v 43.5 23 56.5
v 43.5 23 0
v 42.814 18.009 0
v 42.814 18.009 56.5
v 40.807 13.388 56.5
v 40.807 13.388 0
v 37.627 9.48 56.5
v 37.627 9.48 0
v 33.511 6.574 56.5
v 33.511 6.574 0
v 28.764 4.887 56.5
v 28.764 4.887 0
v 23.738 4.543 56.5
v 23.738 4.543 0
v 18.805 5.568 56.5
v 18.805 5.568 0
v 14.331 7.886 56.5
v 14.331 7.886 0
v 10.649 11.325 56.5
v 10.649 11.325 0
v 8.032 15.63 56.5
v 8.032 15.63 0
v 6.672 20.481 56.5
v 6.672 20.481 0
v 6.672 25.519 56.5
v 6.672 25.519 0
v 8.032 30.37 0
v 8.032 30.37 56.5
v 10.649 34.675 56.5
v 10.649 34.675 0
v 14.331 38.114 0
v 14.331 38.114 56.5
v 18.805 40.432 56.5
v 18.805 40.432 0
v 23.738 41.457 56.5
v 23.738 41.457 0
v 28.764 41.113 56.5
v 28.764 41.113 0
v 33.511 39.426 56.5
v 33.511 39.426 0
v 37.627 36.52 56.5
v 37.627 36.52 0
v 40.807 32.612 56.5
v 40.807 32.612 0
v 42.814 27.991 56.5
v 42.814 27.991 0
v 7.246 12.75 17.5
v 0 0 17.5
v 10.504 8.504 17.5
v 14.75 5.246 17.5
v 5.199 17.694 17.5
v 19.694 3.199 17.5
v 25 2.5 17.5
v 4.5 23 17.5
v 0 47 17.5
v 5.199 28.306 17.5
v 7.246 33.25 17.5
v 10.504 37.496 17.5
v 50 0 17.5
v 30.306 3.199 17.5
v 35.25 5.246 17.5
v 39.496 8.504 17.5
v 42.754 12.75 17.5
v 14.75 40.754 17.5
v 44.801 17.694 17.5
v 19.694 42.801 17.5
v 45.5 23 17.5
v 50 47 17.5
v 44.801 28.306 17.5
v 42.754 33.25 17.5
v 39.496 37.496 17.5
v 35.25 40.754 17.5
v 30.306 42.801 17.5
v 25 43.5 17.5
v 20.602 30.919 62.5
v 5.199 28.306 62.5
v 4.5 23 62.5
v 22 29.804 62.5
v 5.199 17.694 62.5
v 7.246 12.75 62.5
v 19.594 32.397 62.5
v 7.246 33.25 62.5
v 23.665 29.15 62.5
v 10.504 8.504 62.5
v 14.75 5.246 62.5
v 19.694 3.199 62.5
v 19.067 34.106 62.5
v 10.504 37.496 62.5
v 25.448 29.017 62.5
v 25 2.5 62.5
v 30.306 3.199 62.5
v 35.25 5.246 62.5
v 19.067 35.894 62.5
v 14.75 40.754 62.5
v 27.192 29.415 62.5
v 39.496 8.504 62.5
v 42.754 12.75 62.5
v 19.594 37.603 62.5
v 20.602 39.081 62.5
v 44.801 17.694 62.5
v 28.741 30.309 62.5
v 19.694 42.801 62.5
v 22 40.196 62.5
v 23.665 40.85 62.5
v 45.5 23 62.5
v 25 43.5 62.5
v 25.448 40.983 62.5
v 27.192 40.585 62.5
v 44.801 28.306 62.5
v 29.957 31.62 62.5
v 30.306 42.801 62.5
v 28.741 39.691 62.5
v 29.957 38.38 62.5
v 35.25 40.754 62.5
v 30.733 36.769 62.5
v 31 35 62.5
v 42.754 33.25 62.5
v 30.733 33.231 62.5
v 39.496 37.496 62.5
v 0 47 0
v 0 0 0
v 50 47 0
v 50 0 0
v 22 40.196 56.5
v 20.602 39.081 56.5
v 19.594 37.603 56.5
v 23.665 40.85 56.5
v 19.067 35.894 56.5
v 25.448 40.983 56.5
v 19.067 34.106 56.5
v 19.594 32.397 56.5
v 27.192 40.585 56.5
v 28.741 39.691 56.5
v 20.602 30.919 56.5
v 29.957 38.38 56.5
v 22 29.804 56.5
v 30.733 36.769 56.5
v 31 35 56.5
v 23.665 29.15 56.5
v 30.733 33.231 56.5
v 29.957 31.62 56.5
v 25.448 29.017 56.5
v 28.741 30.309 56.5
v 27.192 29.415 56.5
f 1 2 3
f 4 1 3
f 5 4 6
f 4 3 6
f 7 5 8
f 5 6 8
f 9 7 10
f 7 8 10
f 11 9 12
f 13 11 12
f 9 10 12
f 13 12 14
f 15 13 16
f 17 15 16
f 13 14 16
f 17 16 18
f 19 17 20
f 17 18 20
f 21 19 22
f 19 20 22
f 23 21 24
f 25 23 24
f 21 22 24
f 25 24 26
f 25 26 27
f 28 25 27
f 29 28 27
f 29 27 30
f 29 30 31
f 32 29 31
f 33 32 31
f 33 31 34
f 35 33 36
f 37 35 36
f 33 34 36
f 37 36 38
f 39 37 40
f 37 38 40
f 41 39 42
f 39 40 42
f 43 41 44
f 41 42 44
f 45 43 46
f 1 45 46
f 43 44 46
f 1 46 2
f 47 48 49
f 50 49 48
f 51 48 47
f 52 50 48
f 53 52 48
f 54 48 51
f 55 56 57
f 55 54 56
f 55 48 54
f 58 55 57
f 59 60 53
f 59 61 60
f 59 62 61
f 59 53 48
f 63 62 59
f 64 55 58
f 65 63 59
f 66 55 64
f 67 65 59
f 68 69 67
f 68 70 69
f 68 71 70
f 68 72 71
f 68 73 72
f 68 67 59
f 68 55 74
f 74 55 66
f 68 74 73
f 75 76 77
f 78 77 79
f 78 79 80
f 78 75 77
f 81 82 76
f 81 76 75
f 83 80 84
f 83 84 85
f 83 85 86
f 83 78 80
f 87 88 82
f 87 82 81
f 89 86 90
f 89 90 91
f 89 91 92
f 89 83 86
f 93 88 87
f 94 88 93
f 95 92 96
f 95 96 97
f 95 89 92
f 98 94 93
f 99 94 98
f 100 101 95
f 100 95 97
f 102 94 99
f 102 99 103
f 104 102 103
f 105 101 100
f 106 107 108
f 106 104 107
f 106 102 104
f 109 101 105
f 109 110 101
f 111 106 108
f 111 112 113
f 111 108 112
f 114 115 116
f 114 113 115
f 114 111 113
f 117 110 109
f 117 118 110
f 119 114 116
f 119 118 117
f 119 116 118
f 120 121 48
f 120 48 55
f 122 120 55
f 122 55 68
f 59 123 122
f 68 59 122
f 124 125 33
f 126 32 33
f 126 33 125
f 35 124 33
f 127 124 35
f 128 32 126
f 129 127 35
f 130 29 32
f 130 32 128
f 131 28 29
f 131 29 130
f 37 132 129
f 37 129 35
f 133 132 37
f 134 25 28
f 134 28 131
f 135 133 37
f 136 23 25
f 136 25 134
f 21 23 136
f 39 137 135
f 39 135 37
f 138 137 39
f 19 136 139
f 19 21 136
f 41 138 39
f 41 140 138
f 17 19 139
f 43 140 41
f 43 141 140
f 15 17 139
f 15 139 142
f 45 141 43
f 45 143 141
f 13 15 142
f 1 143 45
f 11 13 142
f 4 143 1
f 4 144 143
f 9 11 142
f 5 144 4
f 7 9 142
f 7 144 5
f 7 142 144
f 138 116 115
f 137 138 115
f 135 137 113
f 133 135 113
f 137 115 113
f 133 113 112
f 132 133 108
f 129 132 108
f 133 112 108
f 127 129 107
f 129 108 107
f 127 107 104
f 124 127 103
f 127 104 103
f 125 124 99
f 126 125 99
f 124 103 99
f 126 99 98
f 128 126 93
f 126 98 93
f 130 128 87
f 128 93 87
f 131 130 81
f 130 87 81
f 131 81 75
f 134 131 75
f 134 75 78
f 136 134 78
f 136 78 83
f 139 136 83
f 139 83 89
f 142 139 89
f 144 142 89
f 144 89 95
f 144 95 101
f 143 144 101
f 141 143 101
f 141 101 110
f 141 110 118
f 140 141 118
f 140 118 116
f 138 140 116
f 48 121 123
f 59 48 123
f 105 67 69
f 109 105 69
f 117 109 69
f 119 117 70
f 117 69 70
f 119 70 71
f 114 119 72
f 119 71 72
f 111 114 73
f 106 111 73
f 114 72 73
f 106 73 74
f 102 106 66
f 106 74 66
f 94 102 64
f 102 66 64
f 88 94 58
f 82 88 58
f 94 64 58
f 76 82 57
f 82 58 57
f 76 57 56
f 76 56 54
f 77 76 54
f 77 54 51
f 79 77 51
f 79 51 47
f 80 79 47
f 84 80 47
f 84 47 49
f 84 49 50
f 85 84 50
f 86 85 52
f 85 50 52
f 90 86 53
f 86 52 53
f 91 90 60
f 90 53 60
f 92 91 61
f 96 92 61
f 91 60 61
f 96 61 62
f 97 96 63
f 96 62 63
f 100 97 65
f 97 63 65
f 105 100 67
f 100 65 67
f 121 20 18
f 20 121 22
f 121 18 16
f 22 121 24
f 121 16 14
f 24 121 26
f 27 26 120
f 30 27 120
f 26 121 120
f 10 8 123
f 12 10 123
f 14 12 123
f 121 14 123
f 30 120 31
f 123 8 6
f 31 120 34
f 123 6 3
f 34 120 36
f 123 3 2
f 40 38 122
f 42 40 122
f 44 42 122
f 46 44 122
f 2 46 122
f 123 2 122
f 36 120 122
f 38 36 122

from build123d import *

# Parameters (mm, degrees)
F0_W     = 50
F0_H     = 47
F1_DEPTH = 17.5
F2_R     = 20.5
F3_DEPTH = 45
F4_R     = 18.5
F5_DEPTH = 56.5
F6_R     = 6
F7_DEPTH = 25


with BuildPart() as f1:
    # F0 (on Top) → F1 (new body)
    with BuildSketch(Plane.XY):
        with Locations((25, 23.5)):
            Rectangle(F0_W, F0_H)
    extrude(amount=F1_DEPTH)

    # F2 (on face) → F3 (join)
    with BuildSketch(Plane.XY.offset(17.5)):
        with Locations((25, 23)):
            Circle(F2_R)
    extrude(amount=F3_DEPTH)

    # F4 (on face) → F5 (cut)
    with BuildSketch(Plane(origin=(0, 0, 0), x_dir=(1, 0, 0), z_dir=(0, 0, -1))):
        with Locations((25, -23)):
            Circle(F4_R)
    extrude(amount=-F5_DEPTH, mode=Mode.SUBTRACT)

    # F6 (on face) → F7 (cut)
    with BuildSketch(Plane.XY.offset(62.5)):
        with Locations((25, 35)):
            Circle(F6_R)
    extrude(amount=-F7_DEPTH, mode=Mode.SUBTRACT)


solid = f1.part
